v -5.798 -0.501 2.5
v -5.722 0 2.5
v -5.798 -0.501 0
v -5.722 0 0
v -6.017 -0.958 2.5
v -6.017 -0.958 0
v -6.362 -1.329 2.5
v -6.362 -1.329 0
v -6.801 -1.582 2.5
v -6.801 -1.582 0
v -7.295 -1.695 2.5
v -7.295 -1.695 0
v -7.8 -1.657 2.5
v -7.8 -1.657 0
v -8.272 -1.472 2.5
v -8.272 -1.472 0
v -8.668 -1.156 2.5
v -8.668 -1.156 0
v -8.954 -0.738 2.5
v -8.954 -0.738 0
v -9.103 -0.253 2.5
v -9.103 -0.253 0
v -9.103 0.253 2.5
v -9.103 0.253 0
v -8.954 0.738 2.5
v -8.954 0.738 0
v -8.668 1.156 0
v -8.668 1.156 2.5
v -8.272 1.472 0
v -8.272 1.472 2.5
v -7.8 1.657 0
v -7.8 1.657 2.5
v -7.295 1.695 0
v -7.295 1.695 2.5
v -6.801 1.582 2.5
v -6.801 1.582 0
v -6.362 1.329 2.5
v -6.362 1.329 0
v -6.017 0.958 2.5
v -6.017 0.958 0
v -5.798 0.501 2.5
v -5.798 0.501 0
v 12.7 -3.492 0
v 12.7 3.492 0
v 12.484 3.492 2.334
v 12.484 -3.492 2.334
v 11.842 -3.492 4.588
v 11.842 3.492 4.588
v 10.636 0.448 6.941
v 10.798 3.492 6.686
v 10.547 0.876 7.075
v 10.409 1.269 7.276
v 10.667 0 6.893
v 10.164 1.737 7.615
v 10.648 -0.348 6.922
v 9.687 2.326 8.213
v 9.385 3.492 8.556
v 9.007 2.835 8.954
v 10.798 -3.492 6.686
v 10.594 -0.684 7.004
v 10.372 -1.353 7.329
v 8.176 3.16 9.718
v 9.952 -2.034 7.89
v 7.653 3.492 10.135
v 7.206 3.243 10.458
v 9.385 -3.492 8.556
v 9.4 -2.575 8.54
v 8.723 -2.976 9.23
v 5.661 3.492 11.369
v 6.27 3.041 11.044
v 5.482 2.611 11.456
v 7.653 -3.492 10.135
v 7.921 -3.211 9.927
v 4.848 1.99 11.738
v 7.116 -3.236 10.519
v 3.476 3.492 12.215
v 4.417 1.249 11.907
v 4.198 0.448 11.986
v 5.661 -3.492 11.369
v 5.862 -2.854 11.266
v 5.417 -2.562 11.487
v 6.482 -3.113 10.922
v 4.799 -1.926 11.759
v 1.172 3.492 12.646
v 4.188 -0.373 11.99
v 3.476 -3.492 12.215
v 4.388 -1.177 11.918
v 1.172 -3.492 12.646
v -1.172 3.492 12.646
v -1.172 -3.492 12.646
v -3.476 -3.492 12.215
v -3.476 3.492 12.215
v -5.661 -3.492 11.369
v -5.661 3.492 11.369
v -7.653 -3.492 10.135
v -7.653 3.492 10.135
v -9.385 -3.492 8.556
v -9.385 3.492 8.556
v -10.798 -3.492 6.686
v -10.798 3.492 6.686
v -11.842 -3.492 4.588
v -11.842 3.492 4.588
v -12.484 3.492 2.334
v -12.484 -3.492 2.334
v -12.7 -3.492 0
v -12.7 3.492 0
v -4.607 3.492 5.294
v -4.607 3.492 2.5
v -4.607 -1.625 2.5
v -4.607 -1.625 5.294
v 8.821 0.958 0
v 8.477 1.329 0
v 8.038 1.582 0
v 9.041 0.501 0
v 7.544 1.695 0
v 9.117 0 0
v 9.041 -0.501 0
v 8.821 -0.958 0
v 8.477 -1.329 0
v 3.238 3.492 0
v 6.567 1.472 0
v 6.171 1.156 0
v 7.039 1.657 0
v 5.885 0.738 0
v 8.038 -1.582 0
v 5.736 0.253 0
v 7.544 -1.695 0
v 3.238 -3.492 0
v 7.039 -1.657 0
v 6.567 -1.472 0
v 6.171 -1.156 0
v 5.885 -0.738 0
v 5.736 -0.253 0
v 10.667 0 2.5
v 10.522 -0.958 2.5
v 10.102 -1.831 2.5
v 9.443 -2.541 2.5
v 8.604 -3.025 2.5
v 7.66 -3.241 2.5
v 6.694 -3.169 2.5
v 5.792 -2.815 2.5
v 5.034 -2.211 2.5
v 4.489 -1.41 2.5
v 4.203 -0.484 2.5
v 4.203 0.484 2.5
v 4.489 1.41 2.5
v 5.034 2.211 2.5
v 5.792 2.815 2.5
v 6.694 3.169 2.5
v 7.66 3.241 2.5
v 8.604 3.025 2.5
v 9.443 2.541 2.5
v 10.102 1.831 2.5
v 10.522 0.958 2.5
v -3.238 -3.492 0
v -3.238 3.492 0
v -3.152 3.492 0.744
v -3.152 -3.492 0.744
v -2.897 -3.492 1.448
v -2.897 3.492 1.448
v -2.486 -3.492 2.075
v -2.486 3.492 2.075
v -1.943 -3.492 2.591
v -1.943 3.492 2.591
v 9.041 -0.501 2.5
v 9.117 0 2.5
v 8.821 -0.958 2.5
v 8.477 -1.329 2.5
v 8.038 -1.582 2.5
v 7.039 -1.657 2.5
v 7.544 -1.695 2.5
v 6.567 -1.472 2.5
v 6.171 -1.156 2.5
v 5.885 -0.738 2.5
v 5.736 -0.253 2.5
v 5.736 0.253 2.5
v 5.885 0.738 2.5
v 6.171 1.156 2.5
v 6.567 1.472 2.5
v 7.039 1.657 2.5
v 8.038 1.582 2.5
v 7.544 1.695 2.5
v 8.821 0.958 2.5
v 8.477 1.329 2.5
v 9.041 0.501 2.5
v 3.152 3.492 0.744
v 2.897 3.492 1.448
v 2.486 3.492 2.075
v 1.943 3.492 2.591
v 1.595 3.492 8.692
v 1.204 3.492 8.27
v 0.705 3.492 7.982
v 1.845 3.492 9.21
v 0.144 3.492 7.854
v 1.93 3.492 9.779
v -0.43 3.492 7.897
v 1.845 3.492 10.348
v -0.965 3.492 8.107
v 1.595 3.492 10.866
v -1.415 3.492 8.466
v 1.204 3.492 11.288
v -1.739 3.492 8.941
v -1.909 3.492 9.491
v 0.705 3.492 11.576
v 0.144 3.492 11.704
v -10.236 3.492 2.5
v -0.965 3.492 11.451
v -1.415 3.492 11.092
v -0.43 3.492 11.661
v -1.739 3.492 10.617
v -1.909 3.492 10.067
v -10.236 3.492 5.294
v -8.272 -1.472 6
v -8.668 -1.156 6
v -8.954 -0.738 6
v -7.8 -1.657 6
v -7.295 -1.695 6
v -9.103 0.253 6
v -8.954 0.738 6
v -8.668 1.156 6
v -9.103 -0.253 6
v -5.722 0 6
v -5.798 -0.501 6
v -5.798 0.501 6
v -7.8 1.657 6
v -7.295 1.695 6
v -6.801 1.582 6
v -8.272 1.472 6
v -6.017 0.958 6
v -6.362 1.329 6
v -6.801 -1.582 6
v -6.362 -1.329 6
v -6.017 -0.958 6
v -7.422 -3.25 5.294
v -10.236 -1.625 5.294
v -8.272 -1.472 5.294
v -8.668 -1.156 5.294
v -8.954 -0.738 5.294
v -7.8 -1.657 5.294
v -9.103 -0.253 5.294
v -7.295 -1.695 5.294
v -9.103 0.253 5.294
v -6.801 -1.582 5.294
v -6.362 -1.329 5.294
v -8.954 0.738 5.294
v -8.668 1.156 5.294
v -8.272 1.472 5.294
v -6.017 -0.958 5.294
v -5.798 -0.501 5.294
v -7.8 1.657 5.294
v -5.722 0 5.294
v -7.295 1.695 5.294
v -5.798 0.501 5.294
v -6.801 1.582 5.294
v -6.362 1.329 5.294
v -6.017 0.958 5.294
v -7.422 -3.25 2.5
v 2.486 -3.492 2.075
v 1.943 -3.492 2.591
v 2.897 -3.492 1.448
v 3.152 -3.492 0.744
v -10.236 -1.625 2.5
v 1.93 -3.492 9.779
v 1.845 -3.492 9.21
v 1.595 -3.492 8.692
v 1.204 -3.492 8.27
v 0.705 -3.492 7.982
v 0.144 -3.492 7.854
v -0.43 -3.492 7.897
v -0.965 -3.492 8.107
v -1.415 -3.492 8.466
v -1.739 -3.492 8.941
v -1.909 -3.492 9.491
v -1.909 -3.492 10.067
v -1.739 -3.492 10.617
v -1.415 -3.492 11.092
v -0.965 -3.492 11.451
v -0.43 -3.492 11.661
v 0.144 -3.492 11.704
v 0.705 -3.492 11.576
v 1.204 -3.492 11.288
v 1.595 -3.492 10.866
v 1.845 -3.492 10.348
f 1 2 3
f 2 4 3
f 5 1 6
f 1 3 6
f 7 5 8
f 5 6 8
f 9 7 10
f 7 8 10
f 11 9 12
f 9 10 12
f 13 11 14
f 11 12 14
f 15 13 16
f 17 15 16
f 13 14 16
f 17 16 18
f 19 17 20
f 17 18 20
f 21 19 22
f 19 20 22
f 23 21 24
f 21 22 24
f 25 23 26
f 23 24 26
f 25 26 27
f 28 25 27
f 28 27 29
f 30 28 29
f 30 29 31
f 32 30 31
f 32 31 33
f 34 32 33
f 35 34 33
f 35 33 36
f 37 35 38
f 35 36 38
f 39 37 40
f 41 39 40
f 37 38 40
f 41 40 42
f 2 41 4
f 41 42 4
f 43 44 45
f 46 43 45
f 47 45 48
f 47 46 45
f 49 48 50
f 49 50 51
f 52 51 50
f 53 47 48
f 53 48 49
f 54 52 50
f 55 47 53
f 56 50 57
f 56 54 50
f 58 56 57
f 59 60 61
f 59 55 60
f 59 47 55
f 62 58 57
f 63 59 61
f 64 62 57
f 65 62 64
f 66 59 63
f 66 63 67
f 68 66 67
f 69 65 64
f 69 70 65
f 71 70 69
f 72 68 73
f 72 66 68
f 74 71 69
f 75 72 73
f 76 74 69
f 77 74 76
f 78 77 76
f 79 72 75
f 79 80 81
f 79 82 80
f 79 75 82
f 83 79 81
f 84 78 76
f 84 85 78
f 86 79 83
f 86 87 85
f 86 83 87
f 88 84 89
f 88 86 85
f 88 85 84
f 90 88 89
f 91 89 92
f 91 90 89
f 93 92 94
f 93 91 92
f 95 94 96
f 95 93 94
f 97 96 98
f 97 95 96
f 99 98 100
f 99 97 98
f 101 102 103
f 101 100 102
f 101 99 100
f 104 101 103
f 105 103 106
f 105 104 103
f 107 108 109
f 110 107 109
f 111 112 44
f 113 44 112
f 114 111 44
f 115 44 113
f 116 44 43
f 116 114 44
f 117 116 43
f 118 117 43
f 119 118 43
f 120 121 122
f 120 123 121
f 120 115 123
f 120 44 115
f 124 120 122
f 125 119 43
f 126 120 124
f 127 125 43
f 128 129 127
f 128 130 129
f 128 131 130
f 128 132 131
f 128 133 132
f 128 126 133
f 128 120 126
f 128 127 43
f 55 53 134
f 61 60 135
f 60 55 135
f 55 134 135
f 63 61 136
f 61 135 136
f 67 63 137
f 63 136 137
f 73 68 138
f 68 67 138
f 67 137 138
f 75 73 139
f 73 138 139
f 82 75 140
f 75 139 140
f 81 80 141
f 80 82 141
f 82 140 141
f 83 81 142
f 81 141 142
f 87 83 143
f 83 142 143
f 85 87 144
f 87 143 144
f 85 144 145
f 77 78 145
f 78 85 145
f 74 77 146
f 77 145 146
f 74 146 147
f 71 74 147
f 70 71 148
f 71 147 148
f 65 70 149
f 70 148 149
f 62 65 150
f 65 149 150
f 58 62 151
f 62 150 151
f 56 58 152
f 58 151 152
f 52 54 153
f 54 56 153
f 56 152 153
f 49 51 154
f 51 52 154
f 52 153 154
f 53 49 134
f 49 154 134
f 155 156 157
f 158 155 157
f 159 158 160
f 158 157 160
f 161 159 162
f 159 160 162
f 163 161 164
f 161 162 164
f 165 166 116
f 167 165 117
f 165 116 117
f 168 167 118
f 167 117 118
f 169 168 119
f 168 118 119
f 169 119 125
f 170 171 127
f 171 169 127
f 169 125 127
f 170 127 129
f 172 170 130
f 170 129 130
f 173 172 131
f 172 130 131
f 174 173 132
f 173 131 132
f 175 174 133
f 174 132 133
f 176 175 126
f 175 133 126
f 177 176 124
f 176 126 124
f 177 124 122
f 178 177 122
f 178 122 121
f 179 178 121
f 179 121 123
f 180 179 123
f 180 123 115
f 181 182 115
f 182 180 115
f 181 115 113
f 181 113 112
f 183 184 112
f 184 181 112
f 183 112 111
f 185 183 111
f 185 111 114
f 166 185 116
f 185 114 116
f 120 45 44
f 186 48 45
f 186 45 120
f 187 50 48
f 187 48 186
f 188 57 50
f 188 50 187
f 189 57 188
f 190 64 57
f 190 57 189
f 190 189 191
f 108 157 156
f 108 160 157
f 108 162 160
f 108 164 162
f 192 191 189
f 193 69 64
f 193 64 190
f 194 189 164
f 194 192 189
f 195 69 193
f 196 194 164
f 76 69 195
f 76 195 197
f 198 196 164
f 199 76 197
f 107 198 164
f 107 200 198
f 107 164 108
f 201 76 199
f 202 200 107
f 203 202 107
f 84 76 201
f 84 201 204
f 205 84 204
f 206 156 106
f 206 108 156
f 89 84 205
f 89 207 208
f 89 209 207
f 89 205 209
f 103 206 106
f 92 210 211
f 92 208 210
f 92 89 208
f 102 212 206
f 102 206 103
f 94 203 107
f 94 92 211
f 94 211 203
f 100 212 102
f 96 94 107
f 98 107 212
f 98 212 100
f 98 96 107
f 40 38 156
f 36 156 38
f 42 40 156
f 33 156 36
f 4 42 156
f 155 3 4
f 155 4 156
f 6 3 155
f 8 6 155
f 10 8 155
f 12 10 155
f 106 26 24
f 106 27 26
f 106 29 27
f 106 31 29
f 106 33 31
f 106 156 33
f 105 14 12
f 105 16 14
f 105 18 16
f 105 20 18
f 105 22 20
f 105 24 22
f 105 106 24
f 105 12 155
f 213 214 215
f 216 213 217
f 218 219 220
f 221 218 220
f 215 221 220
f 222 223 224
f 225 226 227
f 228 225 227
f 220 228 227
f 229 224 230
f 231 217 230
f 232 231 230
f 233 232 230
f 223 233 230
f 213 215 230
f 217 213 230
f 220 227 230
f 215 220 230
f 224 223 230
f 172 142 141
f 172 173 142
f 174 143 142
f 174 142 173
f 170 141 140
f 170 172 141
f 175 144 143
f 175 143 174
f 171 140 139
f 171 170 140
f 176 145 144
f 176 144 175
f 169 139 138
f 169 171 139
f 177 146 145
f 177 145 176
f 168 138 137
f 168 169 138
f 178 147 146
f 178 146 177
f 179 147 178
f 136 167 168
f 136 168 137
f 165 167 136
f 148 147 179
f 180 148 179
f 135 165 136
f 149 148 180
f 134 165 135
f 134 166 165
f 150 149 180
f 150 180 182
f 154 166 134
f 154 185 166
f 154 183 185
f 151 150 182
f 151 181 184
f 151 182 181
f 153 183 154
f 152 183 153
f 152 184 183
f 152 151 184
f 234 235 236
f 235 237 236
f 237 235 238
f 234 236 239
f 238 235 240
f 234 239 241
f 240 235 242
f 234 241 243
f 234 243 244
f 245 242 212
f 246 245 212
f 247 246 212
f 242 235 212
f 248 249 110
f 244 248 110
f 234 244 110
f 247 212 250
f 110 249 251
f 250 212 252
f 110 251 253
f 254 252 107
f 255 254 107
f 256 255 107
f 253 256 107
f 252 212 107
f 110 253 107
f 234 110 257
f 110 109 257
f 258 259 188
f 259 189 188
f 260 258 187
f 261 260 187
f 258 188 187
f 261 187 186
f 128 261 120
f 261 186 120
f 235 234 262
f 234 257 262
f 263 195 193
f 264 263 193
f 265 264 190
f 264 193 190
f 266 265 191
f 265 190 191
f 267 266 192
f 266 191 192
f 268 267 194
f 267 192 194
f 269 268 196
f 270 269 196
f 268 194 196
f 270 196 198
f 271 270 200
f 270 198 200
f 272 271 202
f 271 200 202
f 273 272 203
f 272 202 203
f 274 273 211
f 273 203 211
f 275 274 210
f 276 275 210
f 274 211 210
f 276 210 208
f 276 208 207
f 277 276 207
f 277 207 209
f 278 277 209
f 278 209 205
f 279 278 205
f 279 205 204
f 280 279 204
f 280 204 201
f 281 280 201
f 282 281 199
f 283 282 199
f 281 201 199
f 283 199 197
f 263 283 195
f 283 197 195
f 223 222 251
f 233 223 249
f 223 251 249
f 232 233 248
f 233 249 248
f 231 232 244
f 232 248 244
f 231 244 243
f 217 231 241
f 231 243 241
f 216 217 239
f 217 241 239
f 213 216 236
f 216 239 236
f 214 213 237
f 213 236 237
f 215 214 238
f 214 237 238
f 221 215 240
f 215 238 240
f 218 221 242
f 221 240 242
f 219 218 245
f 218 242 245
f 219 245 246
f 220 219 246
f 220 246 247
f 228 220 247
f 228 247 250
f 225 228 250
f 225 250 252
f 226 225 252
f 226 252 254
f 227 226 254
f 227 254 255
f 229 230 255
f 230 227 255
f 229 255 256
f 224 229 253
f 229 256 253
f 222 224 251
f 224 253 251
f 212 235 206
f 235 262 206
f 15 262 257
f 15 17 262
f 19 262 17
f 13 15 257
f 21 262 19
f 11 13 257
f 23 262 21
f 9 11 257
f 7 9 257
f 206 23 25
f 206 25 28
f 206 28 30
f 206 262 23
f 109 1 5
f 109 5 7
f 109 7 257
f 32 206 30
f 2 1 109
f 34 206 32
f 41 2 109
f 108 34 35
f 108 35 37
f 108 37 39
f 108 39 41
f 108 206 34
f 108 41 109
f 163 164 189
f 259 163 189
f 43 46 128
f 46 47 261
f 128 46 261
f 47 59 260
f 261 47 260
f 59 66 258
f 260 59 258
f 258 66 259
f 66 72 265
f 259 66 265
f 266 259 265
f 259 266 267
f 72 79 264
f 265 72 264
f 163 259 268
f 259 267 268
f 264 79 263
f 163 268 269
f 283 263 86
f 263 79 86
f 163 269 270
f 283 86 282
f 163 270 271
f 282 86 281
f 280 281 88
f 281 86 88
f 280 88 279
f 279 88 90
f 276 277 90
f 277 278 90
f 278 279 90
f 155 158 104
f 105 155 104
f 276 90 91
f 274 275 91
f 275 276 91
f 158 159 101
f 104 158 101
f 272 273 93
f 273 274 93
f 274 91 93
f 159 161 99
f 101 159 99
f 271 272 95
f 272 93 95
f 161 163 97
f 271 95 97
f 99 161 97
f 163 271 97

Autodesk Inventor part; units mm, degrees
sketch "Sketch1" plane through (0, 0, 0) normal (0, 1, 0) x (-1, 0, 0)
  circle A0 centre (0, 0) radius 12.7
  dimension "d75" = 25.4
extrude "Extrusion1" add sketch "Sketch1" along normal blind 3.4925 and the other way blind 3.4925
ref_plane "Work Plane1" through (0, 0, 2.5) normal (0, 0, 1) x (1, 0, 0)
ref_plane "Work Plane2" through (0, 0, -2.5) normal (0, 0, 1) x (1, 0, 0)
sketch "Sketch2" plane through (0, 0, 0) normal (0, 0, 1) x (1, 0, 0)
  circle A0 centre (7.4168, 0) radius 1.7
  circle A1 centre (-7.4168, 0) radius 1.7
  point P0 (0, 0)
  dimension "d5" = 3.4
  dimension "d6" = 7.4168
  dimension "d7" = 3.4
  dimension "d8" = 7.4168
extrude "Screw hole 2" cut sketch "Sketch2" along normal blind 2.5 and the other way blind 6 contours A0
sketch "Sketch3" plane through (0, 0, 2.5) normal (0, 0, 1) x (1, 0, 0)
  circle A0 centre (7.4168, 0) radius 1.7 projected
  circle A1 centre (7.4168, 0) radius 3.25
  point P0 (0, 0)
  dimension "d19" = 6.5
sketch "Sketch4" plane through (0, 0, -2.5) normal (0, 0, 1) x (1, 0, 0)
  circle A0 centre (7.4168, 0) radius 1.7 projected
  circle A1 centre (7.4168, 0) radius 3.45 construction
  line L0 (7.4168, -3.45) -> (4.429, -1.725)
  line L1 (4.429, -1.725) -> (4.429, 6.985)
  line L2 (10.4046, 6.985) -> (10.4046, -1.725)
  line L3 (10.4046, -1.725) -> (7.4168, -3.45)
  line L4 (10.4046, 6.985) -> (4.429, 6.985)
  point P0 (0, 0)
  dimension "d22" = 6.9
sketch "Sketch5" plane through (0, 0, -2.5) normal (0, 0, 1) x (1, 0, 0)
  circle A0 centre (-7.422, 0) radius 3.25
  point P0 (0, 0)
  dimension "d25" = 6.5
extrude "Access Hole 1" cut sketch "Sketch5" against normal through all
extrude "Access Hole 2" cut sketch "Sketch3" along normal through all contours A0 | A1
extrude "Nut well 2" cut sketch "Sketch4" against normal blind 2.794 contours A0 | L0 L1 L4 L2 L3
sketch "Sketch7" plane through (0, 0, 2.5) normal (0, 0, 1) x (1, 0, 0)
  circle A0 centre (-7.422, 0) radius 3.25 construction
  circle A1 centre (-7.422, 0) radius 3.45 construction
  line L0 (-7.422, -3.25) -> (-10.2365, -1.625)
  line L1 (-10.2365, -1.625) -> (-10.2365, 5.3975)
  line L2 (-4.6074, 5.3975) -> (-4.6074, -1.625)
  line L3 (-4.6074, -1.625) -> (-7.422, -3.25)
  line L4 (16.6201, 5.3975) -> (-16.6201, 5.3975) projected
  line L5 (-10.2365, 5.3975) -> (-4.6074, 5.3975)
  point P0 (0, 0)
  dimension "d48" = 6.9
extrude "Nut Well 1" cut sketch "Sketch7" along normal blind 2.794
sketch "Sketch8" plane through (0, 0, 0) normal (0, 0, 1) x (1, 0, 0)
  circle A0 centre (-7.422, 0) radius 3.25 projected
  circle A1 centre (-7.422, 0) radius 1.7
  point P0 (0, 0)
  dimension "d51" = 3.4
extrude "Screw Hole 1" cut sketch "Sketch8" along normal blind 6 and the other way blind 2.5 contours A1
ref_plane "Work Plane3" through (0, 5.3975, 0) normal (0, 1, 0) x (1, 0, 0)
sketch "Sketch9" plane through (0, 5.3975, 0) normal (0, 1, 0) x (1, 0, 0)
  arc A0 (1.9431, -2.5908) -> (-1.9431, -2.5908) centre (0, 0) ccw
  line L0 (-1.9431, -2.5908) -> (1.9431, -2.5908)
  dimension "d56" = 6.477
  dimension "d57" = 2.5908
extrude "Center shaft" cut sketch "Sketch9" against normal through all
ref_plane "Work Plane4" through (0, 5.3975, 0) normal (0, 1, 0) x (1, 0, 0)
sketch "Sketch10" plane through (0, 5.3975, 0) normal (0, 1, 0) x (1, 0, 0)
  circle A0 centre (0, 9.779) radius 1.9304
  circle A1 centre (0, -9.779) radius 1.9304
  point P0 (0, 0)
  point P1 (0, -8.001)
  dimension "d60" = 3.8608
  dimension "d61" = 9.779
  dimension "d62" = 3.8608
  dimension "d63" = 9.779
extrude "Wheel holes" cut sketch "Sketch10" against normal through all
split "Split1" plane through (0, 0, 0) removes the side toward (0, 0, -1)
equation "\"d63\" = d61"
properties part number "clamping hub .770 .25 D bore left"
